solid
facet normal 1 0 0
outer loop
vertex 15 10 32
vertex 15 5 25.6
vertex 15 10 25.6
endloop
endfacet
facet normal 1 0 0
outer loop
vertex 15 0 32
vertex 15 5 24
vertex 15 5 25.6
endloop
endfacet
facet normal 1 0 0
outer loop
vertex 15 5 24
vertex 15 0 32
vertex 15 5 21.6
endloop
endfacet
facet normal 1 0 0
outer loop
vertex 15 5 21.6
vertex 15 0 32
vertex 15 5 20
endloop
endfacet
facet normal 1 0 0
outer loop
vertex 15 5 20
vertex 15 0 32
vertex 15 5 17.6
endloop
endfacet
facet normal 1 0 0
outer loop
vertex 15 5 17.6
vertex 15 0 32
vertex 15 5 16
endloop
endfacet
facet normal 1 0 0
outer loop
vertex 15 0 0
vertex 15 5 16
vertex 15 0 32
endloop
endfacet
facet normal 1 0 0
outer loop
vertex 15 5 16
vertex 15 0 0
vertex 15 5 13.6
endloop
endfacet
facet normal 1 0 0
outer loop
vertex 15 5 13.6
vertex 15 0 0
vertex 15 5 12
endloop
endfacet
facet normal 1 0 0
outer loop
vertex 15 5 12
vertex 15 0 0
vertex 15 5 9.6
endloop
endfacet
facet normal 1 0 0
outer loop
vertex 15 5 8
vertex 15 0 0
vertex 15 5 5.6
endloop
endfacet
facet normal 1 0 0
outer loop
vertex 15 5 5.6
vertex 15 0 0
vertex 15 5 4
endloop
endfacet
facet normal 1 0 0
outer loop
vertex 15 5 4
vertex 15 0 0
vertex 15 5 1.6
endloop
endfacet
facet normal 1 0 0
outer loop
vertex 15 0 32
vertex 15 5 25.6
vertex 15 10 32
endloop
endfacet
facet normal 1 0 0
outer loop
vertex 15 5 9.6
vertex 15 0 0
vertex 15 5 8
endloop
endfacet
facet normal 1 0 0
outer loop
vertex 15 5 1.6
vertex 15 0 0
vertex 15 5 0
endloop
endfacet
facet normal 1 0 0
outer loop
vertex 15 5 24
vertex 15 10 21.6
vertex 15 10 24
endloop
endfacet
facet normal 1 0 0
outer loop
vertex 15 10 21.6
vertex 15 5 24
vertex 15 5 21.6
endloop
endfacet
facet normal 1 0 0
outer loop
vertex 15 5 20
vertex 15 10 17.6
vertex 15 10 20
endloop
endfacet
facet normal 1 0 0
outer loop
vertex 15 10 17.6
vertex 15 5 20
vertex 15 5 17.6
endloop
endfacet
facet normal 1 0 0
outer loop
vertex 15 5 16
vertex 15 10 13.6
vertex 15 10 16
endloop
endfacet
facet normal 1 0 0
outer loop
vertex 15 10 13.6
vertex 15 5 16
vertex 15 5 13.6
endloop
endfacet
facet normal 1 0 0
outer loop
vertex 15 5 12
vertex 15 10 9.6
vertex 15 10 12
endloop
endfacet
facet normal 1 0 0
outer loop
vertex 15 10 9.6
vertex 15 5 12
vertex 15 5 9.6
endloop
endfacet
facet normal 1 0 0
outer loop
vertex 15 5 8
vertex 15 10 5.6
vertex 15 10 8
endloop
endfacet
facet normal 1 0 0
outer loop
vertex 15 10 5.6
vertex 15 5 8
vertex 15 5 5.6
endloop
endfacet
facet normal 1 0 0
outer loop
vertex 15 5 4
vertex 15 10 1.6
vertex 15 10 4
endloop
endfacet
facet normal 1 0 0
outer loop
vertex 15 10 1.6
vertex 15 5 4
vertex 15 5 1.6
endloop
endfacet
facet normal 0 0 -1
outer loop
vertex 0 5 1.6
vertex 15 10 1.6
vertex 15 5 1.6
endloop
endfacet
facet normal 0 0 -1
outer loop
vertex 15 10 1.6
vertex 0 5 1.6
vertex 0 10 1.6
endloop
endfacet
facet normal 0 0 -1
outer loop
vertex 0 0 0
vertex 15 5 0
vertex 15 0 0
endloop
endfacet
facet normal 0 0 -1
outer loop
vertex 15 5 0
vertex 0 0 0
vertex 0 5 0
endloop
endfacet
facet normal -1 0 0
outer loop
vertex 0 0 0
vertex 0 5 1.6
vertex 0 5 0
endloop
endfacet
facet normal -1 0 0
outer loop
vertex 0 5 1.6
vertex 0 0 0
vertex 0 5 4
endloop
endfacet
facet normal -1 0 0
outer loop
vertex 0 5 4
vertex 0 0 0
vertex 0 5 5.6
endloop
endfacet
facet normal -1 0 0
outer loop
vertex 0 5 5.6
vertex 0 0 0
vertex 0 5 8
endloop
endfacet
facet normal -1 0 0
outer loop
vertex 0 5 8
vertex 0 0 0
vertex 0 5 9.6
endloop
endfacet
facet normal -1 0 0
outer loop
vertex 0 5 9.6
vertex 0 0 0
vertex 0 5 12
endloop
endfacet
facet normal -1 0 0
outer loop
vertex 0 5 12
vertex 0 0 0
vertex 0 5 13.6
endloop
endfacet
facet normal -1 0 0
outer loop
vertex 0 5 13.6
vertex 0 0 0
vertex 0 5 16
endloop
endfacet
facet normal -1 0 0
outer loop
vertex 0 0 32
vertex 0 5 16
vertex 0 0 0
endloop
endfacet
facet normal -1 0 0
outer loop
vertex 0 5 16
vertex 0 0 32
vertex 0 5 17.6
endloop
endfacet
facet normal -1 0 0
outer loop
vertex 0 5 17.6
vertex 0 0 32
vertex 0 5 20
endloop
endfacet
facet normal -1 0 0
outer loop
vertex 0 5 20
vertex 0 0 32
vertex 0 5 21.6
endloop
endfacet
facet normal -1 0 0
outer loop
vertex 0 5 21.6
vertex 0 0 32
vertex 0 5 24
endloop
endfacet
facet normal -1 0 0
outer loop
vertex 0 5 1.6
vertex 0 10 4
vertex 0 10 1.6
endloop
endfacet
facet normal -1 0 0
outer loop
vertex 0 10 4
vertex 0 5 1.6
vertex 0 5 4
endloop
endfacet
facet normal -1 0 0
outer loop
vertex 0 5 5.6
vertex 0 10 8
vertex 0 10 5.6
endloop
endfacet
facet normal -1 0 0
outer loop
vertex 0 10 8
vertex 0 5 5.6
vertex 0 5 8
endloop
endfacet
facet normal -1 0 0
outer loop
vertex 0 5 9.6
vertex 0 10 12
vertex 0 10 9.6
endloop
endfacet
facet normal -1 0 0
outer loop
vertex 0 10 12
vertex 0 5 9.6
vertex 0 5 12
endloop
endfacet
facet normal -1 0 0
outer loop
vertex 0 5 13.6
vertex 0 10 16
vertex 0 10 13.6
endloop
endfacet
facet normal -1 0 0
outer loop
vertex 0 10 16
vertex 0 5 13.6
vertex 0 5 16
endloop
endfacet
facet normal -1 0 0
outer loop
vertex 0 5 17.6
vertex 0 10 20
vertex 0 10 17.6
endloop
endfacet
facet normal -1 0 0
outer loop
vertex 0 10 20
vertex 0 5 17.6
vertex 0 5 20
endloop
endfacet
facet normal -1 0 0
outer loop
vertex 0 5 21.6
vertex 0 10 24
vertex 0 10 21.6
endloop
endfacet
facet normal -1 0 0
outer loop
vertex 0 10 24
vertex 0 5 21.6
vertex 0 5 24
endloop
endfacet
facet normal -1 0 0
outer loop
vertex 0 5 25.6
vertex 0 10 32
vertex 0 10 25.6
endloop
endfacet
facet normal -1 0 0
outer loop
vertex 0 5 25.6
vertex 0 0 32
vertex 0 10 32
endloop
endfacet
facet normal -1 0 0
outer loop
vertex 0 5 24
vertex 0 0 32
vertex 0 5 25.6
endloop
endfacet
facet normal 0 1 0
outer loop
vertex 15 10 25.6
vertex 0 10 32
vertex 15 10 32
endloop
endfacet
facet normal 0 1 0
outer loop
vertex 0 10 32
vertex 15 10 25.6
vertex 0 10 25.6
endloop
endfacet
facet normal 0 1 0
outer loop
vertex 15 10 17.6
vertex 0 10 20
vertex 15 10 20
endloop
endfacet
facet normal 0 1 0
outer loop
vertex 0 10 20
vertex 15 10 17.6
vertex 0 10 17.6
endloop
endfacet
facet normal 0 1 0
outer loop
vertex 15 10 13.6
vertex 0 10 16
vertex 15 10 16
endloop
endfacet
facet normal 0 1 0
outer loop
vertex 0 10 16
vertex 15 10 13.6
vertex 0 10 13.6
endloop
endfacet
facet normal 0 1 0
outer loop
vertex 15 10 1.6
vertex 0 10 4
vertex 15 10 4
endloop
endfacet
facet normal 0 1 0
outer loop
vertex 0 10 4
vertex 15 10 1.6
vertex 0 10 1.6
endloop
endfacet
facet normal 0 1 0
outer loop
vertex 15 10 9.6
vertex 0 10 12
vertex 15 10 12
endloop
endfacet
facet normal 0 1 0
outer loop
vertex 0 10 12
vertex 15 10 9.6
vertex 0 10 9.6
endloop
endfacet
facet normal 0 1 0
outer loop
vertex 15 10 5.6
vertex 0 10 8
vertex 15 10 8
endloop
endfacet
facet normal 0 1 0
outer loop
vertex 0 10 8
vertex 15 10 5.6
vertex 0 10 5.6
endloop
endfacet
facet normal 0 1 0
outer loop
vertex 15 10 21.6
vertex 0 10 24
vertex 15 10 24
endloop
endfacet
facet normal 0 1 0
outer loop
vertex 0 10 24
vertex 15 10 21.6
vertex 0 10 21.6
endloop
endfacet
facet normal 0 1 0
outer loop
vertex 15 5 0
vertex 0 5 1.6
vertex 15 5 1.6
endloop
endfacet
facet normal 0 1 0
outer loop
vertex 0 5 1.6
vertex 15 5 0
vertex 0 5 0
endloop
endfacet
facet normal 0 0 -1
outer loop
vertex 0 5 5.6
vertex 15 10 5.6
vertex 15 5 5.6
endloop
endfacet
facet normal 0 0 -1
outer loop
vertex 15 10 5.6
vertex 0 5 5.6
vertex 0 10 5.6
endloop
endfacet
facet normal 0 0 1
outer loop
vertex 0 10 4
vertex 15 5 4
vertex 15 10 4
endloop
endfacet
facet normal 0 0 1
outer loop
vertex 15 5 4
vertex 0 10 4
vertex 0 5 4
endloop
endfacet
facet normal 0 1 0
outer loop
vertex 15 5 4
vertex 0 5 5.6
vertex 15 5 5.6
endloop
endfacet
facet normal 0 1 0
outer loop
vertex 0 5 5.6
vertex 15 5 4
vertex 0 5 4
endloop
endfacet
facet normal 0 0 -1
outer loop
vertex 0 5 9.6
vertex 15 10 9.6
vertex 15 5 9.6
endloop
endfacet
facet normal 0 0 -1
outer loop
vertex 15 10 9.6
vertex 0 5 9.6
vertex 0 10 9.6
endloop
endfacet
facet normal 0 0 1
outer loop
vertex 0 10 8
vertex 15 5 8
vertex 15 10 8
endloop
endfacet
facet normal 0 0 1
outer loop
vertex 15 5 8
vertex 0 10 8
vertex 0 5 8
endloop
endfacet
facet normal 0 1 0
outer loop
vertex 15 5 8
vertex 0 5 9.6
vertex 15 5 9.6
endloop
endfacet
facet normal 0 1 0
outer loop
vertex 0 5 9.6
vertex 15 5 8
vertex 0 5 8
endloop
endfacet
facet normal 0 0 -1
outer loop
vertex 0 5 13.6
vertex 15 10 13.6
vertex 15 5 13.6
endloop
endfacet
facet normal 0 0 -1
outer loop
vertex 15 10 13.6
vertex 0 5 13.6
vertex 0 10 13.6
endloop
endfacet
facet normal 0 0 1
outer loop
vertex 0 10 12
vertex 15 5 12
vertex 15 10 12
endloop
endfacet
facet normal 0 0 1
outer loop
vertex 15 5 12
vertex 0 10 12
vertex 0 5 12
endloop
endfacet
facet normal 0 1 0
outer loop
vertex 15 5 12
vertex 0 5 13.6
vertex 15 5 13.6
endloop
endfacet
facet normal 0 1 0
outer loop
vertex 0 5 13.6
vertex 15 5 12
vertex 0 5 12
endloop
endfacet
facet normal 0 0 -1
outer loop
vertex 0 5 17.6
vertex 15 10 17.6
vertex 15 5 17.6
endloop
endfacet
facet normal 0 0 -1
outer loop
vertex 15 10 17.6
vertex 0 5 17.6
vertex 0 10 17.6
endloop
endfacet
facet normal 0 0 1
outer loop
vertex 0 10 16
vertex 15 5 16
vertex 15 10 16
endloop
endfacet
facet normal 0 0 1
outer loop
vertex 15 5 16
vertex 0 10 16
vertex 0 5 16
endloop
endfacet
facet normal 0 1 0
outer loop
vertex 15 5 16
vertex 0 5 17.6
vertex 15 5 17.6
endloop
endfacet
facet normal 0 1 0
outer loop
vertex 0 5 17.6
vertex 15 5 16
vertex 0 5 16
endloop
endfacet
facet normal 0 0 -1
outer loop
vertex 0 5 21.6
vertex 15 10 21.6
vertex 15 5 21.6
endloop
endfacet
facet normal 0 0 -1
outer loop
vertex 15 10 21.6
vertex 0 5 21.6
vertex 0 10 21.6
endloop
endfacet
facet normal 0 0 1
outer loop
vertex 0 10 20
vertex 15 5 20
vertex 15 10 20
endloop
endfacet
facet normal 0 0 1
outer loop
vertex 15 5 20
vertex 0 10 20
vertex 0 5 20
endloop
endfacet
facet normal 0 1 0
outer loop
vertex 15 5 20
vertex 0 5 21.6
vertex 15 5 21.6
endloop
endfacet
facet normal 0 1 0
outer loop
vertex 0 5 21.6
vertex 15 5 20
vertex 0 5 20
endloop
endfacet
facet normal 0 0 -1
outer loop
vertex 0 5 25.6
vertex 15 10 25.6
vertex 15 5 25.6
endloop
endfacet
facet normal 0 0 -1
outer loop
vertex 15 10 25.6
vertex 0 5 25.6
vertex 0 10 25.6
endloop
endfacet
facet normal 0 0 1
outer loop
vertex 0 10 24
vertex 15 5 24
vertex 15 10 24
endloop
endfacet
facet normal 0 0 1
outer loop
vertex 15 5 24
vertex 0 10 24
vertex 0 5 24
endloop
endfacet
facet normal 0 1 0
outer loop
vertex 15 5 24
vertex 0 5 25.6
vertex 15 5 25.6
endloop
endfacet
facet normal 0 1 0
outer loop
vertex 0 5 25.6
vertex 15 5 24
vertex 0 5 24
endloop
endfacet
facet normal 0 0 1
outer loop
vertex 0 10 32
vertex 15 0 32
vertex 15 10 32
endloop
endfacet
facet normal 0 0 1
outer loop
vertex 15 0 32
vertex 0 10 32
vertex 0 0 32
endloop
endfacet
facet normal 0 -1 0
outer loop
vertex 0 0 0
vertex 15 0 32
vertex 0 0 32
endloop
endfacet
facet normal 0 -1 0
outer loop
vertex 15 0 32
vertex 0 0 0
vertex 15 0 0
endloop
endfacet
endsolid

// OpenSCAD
difference() {
    cube([15,10,32]);
    for (i = [0:4:24]) {
        translate([0,5,i])
            cube([15,5,1.6]);
    }
    for (i = [0:4:24]) {
        for (j = [0:3:12]) {
            translate([j,5,i])
                cube([3,5,1.6]);
        }
    }
    
}
